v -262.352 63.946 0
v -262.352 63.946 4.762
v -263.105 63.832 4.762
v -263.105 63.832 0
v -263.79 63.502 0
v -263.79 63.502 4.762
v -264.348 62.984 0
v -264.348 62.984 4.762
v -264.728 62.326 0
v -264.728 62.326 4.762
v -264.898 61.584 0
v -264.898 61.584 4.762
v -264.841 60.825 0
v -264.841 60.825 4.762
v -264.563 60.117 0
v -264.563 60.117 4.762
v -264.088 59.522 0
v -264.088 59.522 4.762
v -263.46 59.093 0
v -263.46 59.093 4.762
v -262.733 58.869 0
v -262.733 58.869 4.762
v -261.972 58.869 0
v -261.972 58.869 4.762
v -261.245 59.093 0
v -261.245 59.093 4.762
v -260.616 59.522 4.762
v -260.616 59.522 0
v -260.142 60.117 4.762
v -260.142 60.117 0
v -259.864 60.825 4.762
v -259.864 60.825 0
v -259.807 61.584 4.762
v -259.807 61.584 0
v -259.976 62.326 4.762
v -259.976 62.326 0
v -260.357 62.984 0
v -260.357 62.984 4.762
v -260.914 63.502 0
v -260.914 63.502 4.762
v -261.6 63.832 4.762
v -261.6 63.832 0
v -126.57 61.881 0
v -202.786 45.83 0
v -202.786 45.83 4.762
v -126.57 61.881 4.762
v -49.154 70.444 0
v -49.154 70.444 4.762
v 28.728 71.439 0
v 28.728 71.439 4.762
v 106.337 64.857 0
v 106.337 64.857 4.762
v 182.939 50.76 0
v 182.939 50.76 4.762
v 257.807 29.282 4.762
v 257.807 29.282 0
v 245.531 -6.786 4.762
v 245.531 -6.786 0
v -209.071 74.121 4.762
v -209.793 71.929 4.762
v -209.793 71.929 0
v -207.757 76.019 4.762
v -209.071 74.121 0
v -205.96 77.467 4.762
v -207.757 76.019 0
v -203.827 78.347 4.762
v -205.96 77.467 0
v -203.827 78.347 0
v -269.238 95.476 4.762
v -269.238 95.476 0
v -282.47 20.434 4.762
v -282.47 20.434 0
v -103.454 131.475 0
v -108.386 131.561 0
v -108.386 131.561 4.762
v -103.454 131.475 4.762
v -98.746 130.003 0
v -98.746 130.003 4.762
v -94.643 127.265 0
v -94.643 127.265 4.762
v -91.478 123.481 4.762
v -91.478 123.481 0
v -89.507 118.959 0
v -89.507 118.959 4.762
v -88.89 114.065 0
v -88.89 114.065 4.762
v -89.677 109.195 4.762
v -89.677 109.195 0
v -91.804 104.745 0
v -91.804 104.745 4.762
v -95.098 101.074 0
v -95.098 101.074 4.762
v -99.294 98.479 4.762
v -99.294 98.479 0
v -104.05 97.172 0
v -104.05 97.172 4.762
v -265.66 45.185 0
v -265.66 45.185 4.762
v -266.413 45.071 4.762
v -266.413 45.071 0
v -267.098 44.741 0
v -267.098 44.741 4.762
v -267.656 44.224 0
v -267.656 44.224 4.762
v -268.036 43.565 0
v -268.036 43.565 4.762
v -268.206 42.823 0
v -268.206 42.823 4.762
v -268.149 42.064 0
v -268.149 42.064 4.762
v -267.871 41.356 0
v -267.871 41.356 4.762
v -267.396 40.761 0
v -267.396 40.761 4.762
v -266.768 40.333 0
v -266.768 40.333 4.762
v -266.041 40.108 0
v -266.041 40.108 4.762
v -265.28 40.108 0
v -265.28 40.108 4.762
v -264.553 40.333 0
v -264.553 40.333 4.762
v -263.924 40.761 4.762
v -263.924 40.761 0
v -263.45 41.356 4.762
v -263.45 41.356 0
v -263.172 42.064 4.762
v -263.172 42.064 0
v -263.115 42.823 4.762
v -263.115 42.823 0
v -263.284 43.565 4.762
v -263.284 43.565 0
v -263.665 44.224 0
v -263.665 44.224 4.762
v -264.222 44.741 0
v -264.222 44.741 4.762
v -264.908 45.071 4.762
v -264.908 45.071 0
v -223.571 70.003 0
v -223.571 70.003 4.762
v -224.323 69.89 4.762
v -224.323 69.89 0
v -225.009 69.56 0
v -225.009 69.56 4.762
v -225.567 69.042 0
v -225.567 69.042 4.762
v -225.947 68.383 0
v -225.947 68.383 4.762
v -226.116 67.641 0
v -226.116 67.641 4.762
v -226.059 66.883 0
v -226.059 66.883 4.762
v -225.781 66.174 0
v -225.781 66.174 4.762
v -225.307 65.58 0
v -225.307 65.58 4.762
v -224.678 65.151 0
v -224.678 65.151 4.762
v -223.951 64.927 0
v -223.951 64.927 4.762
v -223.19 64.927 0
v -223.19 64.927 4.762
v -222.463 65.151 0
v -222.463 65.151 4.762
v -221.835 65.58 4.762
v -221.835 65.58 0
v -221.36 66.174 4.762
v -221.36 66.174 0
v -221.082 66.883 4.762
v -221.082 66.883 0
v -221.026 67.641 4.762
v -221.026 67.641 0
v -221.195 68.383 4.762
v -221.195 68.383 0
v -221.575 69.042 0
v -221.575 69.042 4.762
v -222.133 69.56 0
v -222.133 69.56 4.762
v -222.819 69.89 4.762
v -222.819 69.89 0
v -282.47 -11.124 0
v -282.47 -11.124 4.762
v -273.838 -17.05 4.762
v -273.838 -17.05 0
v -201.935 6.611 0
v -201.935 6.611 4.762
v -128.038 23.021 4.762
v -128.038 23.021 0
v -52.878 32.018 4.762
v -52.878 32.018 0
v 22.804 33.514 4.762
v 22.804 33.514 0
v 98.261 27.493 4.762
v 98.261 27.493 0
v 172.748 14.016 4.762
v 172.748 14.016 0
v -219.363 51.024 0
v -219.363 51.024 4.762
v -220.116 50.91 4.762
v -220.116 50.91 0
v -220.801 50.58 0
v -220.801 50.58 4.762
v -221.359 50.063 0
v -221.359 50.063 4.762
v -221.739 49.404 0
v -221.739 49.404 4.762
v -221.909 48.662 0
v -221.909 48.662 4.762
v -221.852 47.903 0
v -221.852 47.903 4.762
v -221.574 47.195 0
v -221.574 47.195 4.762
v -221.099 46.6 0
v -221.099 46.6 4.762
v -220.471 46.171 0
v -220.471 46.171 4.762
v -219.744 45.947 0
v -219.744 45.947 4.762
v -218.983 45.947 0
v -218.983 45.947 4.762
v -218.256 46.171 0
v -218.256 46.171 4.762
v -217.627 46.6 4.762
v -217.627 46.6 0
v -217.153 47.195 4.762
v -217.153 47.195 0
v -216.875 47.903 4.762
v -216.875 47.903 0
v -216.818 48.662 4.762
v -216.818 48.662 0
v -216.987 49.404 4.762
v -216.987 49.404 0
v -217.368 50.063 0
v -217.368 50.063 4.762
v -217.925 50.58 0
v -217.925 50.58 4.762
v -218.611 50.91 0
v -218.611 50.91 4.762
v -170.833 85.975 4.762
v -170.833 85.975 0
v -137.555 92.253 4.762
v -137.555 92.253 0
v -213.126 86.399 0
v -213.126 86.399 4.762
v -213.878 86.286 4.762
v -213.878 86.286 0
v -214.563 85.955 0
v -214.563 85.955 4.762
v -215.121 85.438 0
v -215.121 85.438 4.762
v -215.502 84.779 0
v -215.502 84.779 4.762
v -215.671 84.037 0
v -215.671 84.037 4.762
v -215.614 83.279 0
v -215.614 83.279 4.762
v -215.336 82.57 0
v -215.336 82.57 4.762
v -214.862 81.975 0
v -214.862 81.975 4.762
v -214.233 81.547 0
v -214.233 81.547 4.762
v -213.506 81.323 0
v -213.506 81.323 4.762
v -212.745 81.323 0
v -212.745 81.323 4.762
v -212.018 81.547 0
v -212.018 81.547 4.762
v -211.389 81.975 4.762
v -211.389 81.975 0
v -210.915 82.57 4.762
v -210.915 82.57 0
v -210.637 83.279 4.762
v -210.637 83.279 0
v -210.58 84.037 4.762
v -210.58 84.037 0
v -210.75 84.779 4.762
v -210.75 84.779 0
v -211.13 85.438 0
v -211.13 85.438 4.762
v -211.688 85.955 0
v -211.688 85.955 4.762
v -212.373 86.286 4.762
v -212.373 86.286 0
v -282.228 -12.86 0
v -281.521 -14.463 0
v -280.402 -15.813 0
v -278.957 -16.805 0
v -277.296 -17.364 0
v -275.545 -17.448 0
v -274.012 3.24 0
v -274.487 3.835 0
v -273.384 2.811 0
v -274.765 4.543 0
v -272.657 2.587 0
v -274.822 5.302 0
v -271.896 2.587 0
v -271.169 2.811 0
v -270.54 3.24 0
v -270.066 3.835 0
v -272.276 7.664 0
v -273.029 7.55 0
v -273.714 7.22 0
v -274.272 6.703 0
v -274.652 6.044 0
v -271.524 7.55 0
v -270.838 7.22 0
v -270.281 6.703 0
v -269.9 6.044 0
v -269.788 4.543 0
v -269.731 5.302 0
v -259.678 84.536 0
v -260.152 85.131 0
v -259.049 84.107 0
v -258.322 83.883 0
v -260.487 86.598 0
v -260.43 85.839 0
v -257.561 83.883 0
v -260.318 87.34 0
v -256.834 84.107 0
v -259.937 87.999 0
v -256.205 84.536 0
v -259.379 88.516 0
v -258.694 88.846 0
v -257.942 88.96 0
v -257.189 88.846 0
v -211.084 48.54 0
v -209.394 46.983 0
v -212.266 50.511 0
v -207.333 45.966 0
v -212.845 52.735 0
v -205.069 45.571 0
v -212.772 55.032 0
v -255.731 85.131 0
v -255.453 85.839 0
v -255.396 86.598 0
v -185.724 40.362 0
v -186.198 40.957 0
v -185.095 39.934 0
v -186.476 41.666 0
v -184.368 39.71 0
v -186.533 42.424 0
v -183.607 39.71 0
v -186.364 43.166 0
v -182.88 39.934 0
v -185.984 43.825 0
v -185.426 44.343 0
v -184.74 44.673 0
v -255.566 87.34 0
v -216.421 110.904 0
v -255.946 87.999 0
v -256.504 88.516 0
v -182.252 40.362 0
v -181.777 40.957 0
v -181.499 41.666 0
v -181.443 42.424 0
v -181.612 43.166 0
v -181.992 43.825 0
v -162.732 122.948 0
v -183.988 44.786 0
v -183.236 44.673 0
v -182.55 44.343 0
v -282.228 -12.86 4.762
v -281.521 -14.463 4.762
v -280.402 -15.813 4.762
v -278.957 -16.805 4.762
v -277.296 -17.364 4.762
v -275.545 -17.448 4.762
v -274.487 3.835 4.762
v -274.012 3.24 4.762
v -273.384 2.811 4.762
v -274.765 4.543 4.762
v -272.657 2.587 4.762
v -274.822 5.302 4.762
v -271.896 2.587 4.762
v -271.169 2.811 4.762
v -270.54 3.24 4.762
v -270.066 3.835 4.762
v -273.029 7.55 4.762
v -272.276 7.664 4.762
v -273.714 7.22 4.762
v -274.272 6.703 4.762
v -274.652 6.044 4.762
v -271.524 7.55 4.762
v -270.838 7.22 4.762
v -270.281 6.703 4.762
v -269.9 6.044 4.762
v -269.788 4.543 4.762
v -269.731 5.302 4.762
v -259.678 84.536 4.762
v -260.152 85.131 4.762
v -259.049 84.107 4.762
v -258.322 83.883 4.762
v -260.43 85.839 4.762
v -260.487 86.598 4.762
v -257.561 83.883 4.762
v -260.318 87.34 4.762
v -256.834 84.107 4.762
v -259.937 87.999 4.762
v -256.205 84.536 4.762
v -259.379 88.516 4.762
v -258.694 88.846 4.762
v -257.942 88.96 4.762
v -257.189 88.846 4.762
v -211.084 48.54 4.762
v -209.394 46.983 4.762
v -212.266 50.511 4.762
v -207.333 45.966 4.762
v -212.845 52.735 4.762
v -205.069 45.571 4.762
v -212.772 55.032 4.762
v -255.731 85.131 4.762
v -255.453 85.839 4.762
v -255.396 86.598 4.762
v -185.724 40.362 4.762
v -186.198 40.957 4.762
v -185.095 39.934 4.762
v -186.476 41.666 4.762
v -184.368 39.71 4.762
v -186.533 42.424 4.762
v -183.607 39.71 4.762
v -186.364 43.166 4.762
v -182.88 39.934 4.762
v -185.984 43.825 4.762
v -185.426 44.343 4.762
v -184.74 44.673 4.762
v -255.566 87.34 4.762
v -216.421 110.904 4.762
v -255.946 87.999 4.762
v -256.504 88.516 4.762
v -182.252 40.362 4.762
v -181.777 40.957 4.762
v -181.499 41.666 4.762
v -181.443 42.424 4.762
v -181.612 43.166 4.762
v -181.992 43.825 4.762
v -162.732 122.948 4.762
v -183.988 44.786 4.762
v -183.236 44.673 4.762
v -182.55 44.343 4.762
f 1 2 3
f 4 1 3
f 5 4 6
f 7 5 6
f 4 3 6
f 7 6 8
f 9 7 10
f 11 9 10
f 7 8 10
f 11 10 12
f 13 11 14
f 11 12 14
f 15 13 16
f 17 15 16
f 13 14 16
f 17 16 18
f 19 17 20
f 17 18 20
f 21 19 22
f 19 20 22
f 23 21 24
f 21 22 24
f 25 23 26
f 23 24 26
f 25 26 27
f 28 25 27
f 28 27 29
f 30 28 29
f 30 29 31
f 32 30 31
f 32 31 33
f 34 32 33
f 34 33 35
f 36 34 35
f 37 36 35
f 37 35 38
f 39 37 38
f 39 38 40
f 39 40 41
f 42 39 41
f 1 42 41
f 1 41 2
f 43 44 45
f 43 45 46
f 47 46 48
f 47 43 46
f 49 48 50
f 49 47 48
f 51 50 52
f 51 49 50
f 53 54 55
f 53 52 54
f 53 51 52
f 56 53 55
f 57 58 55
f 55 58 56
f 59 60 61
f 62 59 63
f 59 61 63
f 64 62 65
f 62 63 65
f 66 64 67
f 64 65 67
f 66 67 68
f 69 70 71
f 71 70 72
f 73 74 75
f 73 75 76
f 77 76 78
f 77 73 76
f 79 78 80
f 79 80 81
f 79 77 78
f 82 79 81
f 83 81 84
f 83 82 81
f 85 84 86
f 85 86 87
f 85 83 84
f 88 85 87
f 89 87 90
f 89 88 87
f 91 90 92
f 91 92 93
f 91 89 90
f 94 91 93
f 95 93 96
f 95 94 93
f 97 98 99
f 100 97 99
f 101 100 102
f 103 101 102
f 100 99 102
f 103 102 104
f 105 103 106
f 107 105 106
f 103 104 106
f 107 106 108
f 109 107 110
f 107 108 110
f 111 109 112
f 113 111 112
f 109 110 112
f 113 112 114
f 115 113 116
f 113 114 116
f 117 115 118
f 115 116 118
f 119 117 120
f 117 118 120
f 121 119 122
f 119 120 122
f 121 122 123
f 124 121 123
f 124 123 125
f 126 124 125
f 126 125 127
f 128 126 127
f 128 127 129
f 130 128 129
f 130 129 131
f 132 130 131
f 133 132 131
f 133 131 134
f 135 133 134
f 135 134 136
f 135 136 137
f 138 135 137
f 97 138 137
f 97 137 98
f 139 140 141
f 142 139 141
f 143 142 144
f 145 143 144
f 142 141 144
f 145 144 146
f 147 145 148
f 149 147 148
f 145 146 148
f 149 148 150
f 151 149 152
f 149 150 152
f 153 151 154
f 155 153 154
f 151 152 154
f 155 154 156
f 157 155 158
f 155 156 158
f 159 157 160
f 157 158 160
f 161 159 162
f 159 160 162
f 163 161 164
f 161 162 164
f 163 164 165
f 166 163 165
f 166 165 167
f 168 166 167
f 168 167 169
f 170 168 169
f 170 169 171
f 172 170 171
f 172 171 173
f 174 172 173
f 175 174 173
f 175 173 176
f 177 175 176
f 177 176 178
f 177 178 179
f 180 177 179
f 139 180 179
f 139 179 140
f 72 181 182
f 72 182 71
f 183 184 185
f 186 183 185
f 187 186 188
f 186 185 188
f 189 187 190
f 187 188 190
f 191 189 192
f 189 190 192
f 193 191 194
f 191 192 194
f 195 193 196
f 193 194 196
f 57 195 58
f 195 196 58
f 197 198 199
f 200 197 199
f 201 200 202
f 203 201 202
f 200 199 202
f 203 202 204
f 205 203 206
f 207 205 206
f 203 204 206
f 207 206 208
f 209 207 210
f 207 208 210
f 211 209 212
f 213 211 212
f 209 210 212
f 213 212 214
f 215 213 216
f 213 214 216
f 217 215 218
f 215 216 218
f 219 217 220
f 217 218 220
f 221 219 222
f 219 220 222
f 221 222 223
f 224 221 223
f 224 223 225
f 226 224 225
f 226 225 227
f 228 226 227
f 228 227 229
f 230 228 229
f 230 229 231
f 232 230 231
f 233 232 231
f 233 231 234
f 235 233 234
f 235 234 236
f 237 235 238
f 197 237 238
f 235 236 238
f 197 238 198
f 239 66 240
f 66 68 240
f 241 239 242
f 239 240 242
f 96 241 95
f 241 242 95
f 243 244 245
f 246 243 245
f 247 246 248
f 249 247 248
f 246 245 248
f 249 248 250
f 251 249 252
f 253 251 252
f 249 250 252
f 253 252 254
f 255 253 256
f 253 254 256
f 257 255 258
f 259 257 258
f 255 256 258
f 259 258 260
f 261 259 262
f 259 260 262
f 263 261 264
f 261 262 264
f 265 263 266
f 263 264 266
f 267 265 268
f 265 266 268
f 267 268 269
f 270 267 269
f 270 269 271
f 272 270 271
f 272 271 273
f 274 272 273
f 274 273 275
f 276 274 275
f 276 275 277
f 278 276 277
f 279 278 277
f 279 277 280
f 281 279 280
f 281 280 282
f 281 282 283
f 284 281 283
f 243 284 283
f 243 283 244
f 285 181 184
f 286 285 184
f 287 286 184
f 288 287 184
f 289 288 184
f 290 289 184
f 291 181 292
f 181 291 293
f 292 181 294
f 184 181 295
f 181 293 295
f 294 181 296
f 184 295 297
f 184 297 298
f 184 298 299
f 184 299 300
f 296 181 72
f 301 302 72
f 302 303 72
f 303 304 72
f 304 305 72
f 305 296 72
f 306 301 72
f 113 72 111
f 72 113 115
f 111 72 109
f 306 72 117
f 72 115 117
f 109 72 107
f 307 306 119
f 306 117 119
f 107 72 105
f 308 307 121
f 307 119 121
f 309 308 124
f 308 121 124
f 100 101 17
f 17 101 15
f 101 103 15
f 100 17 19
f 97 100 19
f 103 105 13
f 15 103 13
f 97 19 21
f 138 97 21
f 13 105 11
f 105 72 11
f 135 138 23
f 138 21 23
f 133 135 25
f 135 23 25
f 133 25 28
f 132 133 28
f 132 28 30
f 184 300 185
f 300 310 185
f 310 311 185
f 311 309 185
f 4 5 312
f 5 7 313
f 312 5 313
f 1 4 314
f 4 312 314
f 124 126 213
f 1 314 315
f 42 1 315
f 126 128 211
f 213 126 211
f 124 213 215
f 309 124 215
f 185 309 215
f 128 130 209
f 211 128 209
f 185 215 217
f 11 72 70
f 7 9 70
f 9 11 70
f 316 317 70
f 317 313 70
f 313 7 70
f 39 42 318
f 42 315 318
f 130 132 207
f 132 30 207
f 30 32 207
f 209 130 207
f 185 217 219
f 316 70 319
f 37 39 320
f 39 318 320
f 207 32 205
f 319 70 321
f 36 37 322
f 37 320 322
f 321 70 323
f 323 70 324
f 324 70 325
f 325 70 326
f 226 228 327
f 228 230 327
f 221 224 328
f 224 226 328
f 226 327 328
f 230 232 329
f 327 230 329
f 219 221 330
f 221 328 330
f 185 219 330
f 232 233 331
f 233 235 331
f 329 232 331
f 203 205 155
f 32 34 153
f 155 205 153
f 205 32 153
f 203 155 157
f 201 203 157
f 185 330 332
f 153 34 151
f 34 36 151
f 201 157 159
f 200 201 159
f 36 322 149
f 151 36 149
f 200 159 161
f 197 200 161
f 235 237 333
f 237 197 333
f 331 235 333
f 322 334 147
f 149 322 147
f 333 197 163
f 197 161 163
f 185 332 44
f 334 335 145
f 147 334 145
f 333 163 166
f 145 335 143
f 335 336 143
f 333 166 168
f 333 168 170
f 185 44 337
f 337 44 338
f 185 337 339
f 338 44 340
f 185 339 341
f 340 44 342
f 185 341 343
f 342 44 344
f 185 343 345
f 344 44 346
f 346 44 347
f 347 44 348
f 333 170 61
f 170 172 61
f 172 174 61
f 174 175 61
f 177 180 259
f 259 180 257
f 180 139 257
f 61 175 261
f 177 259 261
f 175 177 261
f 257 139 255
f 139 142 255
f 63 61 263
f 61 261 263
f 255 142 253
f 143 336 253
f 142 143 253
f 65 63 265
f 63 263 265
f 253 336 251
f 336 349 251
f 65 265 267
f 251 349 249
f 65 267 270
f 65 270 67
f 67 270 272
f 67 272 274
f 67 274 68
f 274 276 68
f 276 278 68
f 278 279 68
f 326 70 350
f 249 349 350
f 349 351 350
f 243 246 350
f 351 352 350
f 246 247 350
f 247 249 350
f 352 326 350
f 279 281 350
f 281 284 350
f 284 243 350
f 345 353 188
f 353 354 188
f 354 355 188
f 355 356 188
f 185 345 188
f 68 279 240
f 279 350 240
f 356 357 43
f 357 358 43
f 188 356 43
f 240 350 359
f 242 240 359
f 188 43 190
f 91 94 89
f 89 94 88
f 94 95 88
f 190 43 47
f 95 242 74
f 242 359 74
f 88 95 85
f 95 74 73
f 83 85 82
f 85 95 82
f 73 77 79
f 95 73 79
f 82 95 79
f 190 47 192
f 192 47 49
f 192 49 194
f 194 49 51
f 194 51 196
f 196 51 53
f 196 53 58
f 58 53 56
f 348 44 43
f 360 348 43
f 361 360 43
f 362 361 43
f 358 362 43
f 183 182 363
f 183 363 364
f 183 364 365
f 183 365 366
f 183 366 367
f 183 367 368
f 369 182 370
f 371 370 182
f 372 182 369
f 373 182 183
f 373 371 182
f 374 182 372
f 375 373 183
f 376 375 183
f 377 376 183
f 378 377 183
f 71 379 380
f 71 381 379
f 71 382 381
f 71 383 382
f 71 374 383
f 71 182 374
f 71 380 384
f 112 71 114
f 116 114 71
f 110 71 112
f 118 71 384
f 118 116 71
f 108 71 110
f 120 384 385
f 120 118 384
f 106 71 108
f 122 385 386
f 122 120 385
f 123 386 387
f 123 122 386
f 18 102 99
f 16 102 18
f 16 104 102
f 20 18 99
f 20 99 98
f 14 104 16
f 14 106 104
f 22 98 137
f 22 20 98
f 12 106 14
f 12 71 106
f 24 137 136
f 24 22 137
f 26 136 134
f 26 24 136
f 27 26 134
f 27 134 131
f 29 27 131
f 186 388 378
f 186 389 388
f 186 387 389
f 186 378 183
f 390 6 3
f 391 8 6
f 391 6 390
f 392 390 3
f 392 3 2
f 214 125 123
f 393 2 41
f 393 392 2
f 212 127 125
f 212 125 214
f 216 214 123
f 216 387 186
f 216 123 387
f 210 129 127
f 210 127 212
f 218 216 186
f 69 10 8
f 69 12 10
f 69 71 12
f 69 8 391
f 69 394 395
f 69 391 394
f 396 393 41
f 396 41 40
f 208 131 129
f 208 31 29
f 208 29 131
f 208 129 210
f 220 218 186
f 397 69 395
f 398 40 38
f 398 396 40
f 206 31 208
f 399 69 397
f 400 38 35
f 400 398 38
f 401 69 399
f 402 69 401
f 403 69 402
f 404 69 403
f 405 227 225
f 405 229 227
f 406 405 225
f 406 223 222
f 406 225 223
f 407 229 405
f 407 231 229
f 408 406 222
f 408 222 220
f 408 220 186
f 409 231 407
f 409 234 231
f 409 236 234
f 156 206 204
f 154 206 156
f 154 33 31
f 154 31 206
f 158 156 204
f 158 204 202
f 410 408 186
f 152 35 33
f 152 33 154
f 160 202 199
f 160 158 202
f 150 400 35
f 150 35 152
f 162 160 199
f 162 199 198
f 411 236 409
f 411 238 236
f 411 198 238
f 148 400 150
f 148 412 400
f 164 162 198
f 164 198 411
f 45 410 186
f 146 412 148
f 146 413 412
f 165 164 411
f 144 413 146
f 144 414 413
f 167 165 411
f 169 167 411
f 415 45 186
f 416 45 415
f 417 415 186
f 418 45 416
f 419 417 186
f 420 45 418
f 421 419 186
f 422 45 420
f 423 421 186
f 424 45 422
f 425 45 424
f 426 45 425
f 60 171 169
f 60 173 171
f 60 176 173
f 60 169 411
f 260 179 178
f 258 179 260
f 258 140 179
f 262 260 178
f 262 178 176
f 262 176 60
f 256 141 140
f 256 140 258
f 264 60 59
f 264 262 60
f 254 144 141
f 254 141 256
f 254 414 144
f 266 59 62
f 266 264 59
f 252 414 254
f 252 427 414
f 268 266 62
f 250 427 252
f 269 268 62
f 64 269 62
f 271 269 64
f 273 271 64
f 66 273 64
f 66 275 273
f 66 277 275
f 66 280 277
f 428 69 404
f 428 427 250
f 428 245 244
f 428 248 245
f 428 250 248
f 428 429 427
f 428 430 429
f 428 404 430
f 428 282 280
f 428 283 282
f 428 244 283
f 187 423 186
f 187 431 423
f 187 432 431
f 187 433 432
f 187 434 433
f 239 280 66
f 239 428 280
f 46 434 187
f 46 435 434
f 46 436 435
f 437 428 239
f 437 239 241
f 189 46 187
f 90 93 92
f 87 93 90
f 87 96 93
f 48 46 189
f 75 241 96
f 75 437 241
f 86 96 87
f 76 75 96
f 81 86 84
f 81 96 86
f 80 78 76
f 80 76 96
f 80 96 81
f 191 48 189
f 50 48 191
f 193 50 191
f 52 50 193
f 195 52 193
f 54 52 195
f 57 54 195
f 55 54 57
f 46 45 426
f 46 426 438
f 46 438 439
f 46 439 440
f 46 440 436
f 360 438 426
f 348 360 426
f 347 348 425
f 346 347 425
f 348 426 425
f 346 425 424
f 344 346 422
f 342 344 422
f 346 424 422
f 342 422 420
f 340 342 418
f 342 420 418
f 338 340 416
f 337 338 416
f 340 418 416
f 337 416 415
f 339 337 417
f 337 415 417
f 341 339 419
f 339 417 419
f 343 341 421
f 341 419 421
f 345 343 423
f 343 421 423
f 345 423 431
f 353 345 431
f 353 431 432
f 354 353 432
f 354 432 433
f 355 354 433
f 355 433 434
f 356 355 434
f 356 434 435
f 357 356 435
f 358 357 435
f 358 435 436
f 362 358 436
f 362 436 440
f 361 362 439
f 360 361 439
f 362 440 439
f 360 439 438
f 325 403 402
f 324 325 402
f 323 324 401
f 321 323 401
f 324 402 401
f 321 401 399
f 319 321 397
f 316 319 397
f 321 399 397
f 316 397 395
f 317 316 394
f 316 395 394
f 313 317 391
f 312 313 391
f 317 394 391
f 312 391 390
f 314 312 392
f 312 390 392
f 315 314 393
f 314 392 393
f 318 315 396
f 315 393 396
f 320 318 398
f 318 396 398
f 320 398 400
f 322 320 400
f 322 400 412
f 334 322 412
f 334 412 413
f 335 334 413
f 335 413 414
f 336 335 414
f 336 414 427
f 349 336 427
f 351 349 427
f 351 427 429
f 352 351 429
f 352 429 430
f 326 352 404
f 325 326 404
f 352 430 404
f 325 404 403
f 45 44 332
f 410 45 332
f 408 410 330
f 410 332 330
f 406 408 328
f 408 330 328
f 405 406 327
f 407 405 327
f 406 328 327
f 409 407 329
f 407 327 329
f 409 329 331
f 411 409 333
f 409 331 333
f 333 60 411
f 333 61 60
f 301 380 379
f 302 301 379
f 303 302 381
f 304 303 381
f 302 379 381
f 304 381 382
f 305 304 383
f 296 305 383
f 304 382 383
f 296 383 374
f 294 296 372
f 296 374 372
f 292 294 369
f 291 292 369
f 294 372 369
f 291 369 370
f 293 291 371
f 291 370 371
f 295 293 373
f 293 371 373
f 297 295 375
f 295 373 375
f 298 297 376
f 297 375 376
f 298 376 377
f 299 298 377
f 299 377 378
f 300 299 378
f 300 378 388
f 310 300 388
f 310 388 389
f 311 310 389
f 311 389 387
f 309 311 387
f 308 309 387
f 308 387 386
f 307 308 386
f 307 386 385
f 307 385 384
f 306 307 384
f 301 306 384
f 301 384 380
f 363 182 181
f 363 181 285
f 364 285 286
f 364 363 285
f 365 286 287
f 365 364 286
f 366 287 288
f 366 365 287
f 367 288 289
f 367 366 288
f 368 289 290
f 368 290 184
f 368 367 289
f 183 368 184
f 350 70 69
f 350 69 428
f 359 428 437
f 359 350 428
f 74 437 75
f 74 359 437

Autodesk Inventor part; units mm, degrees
ref_plane "YZ Plane" through (0, 0, 0) normal (1, 0, 0) x (0, 1, 0)
ref_plane "XZ Plane" through (0, 0, 0) normal (0, 1, 0) x (-1, 0, 0)
ref_plane "XY Plane" through (0, 0, 0) normal (0, 0, 1) x (1, 0, 0)
sketch "Sketch1" plane through (0, 0, 0) normal (0, 0, 1) x (1, 0, 0)
  line L0 (-282.4704, -20.4341) -> (-282.4704, 20.4341)
  line L1 (-394.804, 0) -> (382.9893, 0) construction
  arc A0 (245.5307, -6.7859) -> (-282.4704, -20.4341) centre (0, -728.1449) ccw
  arc A1 (257.8072, 29.282) -> (-282.4704, 20.4341) centre (0, -728.1449) ccw
  line L2 (245.5307, -6.7859) -> (257.8072, 29.282)
  line L3 (257.8072, 29.282) -> (259.8533, 35.2933)
  line L4 (259.8533, 35.2933) -> (271.8759, 31.2011)
  line L5 (271.8759, 31.2011) -> (255.5072, -16.8895)
  line L6 (255.5072, -16.8895) -> (243.4846, -12.7973)
  line L7 (243.4846, -12.7973) -> (245.5307, -6.7859)
  line L8 (0, 237.1551) -> (0, -889.0282) construction
  line L9 (0, -728.1449) -> (-282.4704, 0) construction
  arc A2 (205.7125, -1.0346) -> (-280.1164, -26.3317) centre (0, -728.1449) ccw
  line L10 (-280.1164, -26.3317) -> (-282.4704, -20.4341)
  line L11 (243.4846, -12.7973) -> (245.5307, -6.7859)
  point P0 (0, 0)
  point P1 (205.7125, -1.0346)
  dimension "d65" = 762
  dimension "d67" = 50.8
  dimension "d68" = 38.1
  dimension "d69" = 12.7
  dimension "d76" = 40
  dimension "d97" = 800.1
  dimension "d98" = 6.35
extrude "Plate1" add sketch "Sketch1" along normal blind 4.7625 contours L0 A1 L2 A0
sketch "Sketch3" plane through (0, 0, 0) normal (0, 0, -1) x (-1, 0, 0)
  line L0 (269.2384, 95.4765) -> (282.4704, 20.4341)
  arc A0 (282.4704, 20.4341) -> (-257.8072, 29.282) centre (0, -728.1449) ccw
  arc A1 (282.4704, -20.4341) -> (-245.5307, -6.7859) centre (0, -728.1449) ccw construction
  line L1 (0, -900.8528) -> (0, 308.1027) construction
  line L2 (-366.2845, 0) -> (393.0567, 0) construction
  arc A2 (269.2384, 95.4765) -> (108.3857, 131.5609) centre (0, -728.1449) ccw
  arc A3 (108.3857, 131.5609) -> (104.0502, 97.172) centre (106.218, 114.3664) ccw
  arc A4 (203.8267, 78.347) -> (104.0502, 97.172) centre (0, -728.1449) ccw
  arc A5 (209.7927, 71.9287) -> (203.8267, 78.347) centre (201.8507, 70.5283) ccw
  line L3 (209.7927, 71.9287) -> (212.772, 55.032)
  arc A6 (202.7861, 45.8305) -> (212.772, 55.032) centre (204.8301, 53.6316) ccw
  point P0 (0, 0)
  point P1 (-2.2036, 71.9521)
  dimension "d70" = 80
  dimension "d88" = 165.1
  dimension "d91" = 76.2
  dimension "d92" = 101.6
  dimension "d93" = 8.0645
  dimension "d95" = 31.75
sheet face with bend "Face2" sketch "Sketch3" thickness 4.7625 toward (0, 0, 1) bend radius 4.7625
bend "Bend1"
sketch "Sketch5" plane through (0, 0, 0) normal (0, 0, -1) x (-1, 0, 0)
  arc A0 (282.4704, -20.4341) -> (-245.5307, -6.7859) centre (0, -728.1449) ccw construction
  spline S0 degree 3 poles (-4.2317, 35.5309) (-3.9947, 36.2065) (-3.5205, 37.5578) (-2.7876, 39.577) (-2.0409, 41.5912) (-1.5294, 42.9288) (-1.2737, 43.5976) knots 0 0 0 0 0.214807 0.429614 0.644422 0.859229 0.859229 0.859229 0.859229
  spline S1 degree 3 poles (4.2317, 35.5309) (3.9947, 36.2065) (3.5205, 37.5578) (2.7876, 39.577) (2.0409, 41.5912) (1.5294, 42.9288) (1.2737, 43.5976) knots 0 0 0 0 0.214807 0.429614 0.644422 0.859229 0.859229 0.859229 0.859229
  circle A1 centre (0, -728.1449) radius 763.6875
  arc A2 (1.2737, 43.5976) -> (-1.2737, 43.5976) centre (0, -728.1449) ccw
  point P0 (-3.5169, 37.5565)
  point P1 (-2.7853, 39.5762)
  point P2 (-2.0375, 41.5899)
  point P3 (3.5169, 37.5565)
  point P4 (2.7853, 39.5762)
  point P5 (2.0375, 41.5899)
extrude "Extrusion1" [suppressed]
pattern_circular "Circular Pattern1" [suppressed]
sketch "Sketch4" plane through (0, 0, 0) normal (0, 0, -1) x (-1, 0, 0)
  line L0 (282.4704, 20.4341) -> (269.2384, 95.4765) construction
  circle A0 centre (198.5568, 63.04) radius 25.4 construction
  line L1 (177.7503, 77.6089) -> (213.1256, 83.8465) construction
  line L2 (213.1256, 83.8465) -> (183.9879, 42.2336) construction
  line L3 (183.9879, 42.2336) -> (219.3632, 48.4712) construction
  line L4 (173.5426, 58.6294) -> (223.5709, 67.4507) construction
  line L5 (282.4704, 20.4341) -> (269.2384, 95.4765) construction
  line L6 (262.3523, 61.393) -> (265.6603, 42.6324) construction
  line L7 (0, -43.6162) -> (0, 118.6586) construction
  point P0 (0, 0)
  point P1 (257.9416, 86.4071)
  point P2 (272.2763, 5.1112)
  dimension "d31" = 25.4
  dimension "d33" = 12.7
  dimension "d34" = 12.7
  dimension "d42" = 50.8
  dimension "d43" = 45
  dimension "d51" = 5.2605
  dimension "d52" = 19.05
  dimension "d53" = 38.1
  dimension "d89" = 198.5568
  dimension "d90" = 63.04
hole "Hole2" at (-257.9416, 86.4071, 0) at (-262.3523, 61.393, 0) at (-177.7503, 77.6089, 0) at (-173.5426, 58.6294, 0) at (-183.9879, 42.2336, 0) at (-219.3632, 48.4712, 0) at (-223.5709, 67.4507, 0) at (-213.1256, 83.8465, 0) at (-272.2763, 5.1112, 0) at (-265.6603, 42.6324, 0) direction (0, 0, 1) diameter 5.105 end through all clearance for "Flat Head Machine Screw (82)" size "#10" standard "Ansi Unified Screw Threads"
feature "Corner Round4" [suppressed]
feature "Corner Round5" [suppressed]
fillet "Corner Round6" radius 6.35 1 edges at (-282.4704, -20.4341, 2.3813)
equation "\"d33\" = d32"
equation "\"d34\" = d32"
equation "\"d40\" = Thickness"
equation "\"d5\" = Thickness"
equation "\"d22\" = BendRadius"
equation "\"d23\" = BendReliefWidth"
equation "\"d25\" = MinimumRemnant"
equation "\"d24\" = BendReliefDepth"
equation "\"d26\" = TransitionRadius"
equation "\"BendRadius\" = Thickness"
equation "\"BendReliefWidth\" = Thickness"
equation "\"BendReliefDepth\" = 0.5 * Thickness"
equation "\"CornerReliefSize\" = 4 * Thickness"
equation "\"MinimumRemnant\" = 2 * Thickness"
equation "\"TransitionRadius\" = BendRadius"
equation "\"JacobiRadiusSize\" = BendRadius"
equation "\"GapSize\" = Thickness"
equation "\"d32\" = 12.7"
equation "\"Thickness\" = 4.7625"
properties part number "RACK,INSIDE" material "Polycarbonate, PC 1000, Clear"
